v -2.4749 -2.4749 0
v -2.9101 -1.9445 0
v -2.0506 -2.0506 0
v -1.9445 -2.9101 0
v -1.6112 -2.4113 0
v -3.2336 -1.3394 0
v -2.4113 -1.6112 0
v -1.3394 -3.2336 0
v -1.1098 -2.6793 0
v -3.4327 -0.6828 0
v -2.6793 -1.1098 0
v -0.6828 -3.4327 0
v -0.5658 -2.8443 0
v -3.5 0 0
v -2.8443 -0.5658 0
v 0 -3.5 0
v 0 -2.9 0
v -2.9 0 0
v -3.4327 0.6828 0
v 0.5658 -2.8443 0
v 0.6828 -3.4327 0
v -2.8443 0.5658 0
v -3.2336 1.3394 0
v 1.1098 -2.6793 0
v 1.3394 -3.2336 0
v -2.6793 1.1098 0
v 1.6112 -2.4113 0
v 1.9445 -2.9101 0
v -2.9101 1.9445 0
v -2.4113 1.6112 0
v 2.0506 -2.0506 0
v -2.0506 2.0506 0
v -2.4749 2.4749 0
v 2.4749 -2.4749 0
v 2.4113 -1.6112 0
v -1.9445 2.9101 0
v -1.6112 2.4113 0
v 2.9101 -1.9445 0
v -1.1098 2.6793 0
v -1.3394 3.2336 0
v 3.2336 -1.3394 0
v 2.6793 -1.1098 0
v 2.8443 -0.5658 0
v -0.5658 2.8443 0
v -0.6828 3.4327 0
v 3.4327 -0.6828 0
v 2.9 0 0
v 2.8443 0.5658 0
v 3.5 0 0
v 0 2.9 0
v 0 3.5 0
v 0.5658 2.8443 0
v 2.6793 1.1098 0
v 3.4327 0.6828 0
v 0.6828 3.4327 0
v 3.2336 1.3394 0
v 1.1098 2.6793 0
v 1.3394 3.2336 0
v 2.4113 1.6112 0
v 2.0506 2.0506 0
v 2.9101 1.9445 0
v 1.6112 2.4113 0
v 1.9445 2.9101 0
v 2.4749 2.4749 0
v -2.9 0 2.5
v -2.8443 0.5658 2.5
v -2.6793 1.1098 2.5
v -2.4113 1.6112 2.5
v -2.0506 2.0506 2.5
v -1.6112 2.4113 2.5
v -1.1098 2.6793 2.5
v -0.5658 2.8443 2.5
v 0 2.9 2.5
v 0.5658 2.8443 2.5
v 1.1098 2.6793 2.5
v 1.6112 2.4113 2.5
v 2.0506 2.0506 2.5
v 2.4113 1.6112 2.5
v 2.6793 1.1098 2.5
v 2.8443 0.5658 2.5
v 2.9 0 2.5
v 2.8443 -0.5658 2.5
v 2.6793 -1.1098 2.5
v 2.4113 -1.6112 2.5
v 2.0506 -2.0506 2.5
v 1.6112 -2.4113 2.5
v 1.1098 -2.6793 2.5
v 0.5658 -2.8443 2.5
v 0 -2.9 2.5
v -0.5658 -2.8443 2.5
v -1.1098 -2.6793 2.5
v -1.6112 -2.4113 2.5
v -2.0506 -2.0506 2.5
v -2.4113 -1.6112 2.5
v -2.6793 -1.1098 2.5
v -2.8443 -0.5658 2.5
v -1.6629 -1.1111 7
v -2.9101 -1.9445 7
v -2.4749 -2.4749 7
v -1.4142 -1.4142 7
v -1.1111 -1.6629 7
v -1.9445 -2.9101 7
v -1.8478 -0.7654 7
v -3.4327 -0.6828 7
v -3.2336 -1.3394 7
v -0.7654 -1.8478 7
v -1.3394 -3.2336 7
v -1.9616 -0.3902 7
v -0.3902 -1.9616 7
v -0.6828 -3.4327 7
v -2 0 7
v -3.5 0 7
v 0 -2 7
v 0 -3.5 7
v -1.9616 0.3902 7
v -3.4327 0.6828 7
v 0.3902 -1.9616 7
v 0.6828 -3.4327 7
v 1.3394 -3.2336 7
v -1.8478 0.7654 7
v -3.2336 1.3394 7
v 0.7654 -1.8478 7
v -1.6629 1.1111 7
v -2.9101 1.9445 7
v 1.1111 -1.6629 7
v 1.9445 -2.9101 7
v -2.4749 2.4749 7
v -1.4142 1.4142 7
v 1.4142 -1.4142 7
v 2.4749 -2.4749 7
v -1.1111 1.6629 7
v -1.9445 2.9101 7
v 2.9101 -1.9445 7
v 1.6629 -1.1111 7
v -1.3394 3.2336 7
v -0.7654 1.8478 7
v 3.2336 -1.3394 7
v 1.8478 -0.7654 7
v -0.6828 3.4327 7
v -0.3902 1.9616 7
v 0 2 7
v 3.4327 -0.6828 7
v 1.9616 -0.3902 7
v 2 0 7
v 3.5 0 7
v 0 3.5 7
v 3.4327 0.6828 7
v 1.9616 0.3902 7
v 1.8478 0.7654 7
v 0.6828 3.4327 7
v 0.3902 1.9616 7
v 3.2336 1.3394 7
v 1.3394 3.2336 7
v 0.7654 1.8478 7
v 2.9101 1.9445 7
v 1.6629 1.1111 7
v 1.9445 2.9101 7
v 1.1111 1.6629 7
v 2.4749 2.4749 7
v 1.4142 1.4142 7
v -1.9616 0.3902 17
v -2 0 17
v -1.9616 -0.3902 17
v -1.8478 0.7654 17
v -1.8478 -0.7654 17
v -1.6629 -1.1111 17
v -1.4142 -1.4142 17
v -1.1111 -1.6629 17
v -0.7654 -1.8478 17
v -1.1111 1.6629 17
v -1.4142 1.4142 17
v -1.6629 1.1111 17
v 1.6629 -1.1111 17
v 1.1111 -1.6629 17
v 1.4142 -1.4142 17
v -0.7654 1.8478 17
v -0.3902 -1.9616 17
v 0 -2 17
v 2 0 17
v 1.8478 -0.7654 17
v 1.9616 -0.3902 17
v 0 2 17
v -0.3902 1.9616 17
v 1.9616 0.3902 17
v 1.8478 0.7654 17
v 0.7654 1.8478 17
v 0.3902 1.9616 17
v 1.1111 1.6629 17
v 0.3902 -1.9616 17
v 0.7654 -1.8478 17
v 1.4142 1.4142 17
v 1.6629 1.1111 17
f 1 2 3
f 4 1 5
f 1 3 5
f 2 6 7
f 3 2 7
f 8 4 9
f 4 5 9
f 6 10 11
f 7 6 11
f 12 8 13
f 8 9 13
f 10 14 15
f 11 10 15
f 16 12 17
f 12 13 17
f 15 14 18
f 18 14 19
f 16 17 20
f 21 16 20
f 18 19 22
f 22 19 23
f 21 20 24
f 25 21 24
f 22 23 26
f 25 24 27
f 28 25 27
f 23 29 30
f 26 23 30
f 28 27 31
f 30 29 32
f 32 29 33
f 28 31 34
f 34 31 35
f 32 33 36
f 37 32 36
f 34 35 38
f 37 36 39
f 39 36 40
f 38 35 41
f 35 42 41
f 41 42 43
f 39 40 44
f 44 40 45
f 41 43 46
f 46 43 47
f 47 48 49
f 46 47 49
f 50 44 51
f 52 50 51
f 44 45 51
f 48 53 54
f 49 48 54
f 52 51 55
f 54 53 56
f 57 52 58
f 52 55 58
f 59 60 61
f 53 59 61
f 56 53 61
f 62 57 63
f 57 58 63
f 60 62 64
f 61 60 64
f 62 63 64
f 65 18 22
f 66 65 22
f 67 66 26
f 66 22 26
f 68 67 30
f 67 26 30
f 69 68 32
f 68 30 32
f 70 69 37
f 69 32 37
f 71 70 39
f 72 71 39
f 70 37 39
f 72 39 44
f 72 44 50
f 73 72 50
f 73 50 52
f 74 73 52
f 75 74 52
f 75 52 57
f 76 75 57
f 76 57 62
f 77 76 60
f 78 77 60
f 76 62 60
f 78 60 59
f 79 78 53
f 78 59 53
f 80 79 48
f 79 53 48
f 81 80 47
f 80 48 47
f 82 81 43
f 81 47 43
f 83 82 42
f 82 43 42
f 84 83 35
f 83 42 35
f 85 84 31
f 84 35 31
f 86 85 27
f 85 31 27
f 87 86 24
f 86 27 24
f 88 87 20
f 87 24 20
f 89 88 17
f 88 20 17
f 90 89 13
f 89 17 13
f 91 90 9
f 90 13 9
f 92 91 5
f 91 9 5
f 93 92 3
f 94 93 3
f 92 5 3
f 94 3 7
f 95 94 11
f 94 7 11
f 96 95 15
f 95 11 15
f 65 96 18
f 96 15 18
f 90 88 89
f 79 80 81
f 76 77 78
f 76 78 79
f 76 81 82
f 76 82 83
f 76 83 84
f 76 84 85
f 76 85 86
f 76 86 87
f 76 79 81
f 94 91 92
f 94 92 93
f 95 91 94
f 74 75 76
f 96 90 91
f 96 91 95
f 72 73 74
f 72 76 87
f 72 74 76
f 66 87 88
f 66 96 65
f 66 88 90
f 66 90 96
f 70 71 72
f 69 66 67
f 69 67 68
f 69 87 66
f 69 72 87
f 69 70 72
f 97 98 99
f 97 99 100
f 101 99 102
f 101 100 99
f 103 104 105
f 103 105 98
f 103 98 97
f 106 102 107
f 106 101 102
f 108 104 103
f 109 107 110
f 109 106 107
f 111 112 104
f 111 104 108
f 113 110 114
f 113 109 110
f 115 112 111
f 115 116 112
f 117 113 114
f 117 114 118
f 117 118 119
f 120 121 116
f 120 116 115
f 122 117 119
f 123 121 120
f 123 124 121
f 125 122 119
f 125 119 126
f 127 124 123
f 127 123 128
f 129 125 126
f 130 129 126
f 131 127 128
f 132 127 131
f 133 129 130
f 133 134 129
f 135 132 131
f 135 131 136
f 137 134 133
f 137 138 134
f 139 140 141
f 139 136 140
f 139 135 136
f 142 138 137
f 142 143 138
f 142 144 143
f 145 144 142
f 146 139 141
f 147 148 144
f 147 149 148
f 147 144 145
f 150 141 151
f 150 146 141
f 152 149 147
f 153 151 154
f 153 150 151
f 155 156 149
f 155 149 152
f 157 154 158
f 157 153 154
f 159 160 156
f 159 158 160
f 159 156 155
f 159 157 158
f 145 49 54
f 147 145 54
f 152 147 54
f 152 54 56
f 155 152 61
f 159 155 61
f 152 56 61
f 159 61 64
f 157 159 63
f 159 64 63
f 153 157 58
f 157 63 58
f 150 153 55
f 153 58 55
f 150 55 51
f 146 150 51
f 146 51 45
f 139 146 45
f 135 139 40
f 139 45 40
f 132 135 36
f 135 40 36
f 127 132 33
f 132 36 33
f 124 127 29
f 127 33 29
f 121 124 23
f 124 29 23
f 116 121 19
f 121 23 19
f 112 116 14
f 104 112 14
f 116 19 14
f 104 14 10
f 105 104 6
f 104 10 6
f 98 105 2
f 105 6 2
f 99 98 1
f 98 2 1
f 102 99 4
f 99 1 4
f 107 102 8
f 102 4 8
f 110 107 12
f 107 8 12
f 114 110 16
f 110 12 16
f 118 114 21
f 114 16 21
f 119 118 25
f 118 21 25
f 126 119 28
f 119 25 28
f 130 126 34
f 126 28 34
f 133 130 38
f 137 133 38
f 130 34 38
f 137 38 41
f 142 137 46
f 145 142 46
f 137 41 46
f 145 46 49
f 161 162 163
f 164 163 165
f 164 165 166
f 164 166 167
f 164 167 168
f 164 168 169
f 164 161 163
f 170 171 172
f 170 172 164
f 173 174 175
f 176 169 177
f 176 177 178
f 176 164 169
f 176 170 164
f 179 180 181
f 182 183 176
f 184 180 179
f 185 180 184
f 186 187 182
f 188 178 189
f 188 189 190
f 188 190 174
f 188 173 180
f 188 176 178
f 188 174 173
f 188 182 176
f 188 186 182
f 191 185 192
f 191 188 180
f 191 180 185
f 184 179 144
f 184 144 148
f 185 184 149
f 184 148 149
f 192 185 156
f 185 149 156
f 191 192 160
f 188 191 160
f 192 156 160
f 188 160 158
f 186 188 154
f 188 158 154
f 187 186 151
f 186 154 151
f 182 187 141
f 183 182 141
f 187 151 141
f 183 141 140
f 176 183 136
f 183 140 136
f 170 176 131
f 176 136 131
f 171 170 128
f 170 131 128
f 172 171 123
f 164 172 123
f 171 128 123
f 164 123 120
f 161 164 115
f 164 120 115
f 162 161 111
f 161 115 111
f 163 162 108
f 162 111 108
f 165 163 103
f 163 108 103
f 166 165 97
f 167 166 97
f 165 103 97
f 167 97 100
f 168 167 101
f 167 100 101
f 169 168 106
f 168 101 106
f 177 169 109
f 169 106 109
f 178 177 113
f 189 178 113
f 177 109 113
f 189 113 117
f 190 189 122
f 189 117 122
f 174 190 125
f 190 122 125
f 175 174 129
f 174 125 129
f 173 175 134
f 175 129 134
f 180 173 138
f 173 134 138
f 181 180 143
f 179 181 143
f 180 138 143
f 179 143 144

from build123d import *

# Parameters (mm, degrees)
ESQUISSE1_R             = 3.5
BOSS_EXTRU_1_DEPTH      = 7
ESQUISSE2_R             = 2.9
ENL_V_MAT_EXTRU_1_DEPTH = 2.5
ESQUISSE3_R             = 2
BOSS_EXTRU_2_DEPTH      = 10


with BuildPart() as part:
    # Esquisse1 → Boss.-Extru.1 (new body)
    with BuildSketch(Plane.XY):
        Circle(ESQUISSE1_R)
    extrude(amount=BOSS_EXTRU_1_DEPTH)

    # Esquisse2 → Enlèv. mat.-Extru.1 (cut)
    with BuildSketch(Plane(origin=(0, 0, 0), x_dir=(-1, 0, 0), z_dir=(0, 0, -1))):
        Circle(ESQUISSE2_R)
    extrude(amount=-ENL_V_MAT_EXTRU_1_DEPTH, mode=Mode.SUBTRACT)

    # Esquisse3 → Boss.-Extru.2 (add)
    with BuildSketch(Plane.XY.offset(7)):
        Circle(ESQUISSE3_R)
    extrude(amount=BOSS_EXTRU_2_DEPTH)


solid = part.part
